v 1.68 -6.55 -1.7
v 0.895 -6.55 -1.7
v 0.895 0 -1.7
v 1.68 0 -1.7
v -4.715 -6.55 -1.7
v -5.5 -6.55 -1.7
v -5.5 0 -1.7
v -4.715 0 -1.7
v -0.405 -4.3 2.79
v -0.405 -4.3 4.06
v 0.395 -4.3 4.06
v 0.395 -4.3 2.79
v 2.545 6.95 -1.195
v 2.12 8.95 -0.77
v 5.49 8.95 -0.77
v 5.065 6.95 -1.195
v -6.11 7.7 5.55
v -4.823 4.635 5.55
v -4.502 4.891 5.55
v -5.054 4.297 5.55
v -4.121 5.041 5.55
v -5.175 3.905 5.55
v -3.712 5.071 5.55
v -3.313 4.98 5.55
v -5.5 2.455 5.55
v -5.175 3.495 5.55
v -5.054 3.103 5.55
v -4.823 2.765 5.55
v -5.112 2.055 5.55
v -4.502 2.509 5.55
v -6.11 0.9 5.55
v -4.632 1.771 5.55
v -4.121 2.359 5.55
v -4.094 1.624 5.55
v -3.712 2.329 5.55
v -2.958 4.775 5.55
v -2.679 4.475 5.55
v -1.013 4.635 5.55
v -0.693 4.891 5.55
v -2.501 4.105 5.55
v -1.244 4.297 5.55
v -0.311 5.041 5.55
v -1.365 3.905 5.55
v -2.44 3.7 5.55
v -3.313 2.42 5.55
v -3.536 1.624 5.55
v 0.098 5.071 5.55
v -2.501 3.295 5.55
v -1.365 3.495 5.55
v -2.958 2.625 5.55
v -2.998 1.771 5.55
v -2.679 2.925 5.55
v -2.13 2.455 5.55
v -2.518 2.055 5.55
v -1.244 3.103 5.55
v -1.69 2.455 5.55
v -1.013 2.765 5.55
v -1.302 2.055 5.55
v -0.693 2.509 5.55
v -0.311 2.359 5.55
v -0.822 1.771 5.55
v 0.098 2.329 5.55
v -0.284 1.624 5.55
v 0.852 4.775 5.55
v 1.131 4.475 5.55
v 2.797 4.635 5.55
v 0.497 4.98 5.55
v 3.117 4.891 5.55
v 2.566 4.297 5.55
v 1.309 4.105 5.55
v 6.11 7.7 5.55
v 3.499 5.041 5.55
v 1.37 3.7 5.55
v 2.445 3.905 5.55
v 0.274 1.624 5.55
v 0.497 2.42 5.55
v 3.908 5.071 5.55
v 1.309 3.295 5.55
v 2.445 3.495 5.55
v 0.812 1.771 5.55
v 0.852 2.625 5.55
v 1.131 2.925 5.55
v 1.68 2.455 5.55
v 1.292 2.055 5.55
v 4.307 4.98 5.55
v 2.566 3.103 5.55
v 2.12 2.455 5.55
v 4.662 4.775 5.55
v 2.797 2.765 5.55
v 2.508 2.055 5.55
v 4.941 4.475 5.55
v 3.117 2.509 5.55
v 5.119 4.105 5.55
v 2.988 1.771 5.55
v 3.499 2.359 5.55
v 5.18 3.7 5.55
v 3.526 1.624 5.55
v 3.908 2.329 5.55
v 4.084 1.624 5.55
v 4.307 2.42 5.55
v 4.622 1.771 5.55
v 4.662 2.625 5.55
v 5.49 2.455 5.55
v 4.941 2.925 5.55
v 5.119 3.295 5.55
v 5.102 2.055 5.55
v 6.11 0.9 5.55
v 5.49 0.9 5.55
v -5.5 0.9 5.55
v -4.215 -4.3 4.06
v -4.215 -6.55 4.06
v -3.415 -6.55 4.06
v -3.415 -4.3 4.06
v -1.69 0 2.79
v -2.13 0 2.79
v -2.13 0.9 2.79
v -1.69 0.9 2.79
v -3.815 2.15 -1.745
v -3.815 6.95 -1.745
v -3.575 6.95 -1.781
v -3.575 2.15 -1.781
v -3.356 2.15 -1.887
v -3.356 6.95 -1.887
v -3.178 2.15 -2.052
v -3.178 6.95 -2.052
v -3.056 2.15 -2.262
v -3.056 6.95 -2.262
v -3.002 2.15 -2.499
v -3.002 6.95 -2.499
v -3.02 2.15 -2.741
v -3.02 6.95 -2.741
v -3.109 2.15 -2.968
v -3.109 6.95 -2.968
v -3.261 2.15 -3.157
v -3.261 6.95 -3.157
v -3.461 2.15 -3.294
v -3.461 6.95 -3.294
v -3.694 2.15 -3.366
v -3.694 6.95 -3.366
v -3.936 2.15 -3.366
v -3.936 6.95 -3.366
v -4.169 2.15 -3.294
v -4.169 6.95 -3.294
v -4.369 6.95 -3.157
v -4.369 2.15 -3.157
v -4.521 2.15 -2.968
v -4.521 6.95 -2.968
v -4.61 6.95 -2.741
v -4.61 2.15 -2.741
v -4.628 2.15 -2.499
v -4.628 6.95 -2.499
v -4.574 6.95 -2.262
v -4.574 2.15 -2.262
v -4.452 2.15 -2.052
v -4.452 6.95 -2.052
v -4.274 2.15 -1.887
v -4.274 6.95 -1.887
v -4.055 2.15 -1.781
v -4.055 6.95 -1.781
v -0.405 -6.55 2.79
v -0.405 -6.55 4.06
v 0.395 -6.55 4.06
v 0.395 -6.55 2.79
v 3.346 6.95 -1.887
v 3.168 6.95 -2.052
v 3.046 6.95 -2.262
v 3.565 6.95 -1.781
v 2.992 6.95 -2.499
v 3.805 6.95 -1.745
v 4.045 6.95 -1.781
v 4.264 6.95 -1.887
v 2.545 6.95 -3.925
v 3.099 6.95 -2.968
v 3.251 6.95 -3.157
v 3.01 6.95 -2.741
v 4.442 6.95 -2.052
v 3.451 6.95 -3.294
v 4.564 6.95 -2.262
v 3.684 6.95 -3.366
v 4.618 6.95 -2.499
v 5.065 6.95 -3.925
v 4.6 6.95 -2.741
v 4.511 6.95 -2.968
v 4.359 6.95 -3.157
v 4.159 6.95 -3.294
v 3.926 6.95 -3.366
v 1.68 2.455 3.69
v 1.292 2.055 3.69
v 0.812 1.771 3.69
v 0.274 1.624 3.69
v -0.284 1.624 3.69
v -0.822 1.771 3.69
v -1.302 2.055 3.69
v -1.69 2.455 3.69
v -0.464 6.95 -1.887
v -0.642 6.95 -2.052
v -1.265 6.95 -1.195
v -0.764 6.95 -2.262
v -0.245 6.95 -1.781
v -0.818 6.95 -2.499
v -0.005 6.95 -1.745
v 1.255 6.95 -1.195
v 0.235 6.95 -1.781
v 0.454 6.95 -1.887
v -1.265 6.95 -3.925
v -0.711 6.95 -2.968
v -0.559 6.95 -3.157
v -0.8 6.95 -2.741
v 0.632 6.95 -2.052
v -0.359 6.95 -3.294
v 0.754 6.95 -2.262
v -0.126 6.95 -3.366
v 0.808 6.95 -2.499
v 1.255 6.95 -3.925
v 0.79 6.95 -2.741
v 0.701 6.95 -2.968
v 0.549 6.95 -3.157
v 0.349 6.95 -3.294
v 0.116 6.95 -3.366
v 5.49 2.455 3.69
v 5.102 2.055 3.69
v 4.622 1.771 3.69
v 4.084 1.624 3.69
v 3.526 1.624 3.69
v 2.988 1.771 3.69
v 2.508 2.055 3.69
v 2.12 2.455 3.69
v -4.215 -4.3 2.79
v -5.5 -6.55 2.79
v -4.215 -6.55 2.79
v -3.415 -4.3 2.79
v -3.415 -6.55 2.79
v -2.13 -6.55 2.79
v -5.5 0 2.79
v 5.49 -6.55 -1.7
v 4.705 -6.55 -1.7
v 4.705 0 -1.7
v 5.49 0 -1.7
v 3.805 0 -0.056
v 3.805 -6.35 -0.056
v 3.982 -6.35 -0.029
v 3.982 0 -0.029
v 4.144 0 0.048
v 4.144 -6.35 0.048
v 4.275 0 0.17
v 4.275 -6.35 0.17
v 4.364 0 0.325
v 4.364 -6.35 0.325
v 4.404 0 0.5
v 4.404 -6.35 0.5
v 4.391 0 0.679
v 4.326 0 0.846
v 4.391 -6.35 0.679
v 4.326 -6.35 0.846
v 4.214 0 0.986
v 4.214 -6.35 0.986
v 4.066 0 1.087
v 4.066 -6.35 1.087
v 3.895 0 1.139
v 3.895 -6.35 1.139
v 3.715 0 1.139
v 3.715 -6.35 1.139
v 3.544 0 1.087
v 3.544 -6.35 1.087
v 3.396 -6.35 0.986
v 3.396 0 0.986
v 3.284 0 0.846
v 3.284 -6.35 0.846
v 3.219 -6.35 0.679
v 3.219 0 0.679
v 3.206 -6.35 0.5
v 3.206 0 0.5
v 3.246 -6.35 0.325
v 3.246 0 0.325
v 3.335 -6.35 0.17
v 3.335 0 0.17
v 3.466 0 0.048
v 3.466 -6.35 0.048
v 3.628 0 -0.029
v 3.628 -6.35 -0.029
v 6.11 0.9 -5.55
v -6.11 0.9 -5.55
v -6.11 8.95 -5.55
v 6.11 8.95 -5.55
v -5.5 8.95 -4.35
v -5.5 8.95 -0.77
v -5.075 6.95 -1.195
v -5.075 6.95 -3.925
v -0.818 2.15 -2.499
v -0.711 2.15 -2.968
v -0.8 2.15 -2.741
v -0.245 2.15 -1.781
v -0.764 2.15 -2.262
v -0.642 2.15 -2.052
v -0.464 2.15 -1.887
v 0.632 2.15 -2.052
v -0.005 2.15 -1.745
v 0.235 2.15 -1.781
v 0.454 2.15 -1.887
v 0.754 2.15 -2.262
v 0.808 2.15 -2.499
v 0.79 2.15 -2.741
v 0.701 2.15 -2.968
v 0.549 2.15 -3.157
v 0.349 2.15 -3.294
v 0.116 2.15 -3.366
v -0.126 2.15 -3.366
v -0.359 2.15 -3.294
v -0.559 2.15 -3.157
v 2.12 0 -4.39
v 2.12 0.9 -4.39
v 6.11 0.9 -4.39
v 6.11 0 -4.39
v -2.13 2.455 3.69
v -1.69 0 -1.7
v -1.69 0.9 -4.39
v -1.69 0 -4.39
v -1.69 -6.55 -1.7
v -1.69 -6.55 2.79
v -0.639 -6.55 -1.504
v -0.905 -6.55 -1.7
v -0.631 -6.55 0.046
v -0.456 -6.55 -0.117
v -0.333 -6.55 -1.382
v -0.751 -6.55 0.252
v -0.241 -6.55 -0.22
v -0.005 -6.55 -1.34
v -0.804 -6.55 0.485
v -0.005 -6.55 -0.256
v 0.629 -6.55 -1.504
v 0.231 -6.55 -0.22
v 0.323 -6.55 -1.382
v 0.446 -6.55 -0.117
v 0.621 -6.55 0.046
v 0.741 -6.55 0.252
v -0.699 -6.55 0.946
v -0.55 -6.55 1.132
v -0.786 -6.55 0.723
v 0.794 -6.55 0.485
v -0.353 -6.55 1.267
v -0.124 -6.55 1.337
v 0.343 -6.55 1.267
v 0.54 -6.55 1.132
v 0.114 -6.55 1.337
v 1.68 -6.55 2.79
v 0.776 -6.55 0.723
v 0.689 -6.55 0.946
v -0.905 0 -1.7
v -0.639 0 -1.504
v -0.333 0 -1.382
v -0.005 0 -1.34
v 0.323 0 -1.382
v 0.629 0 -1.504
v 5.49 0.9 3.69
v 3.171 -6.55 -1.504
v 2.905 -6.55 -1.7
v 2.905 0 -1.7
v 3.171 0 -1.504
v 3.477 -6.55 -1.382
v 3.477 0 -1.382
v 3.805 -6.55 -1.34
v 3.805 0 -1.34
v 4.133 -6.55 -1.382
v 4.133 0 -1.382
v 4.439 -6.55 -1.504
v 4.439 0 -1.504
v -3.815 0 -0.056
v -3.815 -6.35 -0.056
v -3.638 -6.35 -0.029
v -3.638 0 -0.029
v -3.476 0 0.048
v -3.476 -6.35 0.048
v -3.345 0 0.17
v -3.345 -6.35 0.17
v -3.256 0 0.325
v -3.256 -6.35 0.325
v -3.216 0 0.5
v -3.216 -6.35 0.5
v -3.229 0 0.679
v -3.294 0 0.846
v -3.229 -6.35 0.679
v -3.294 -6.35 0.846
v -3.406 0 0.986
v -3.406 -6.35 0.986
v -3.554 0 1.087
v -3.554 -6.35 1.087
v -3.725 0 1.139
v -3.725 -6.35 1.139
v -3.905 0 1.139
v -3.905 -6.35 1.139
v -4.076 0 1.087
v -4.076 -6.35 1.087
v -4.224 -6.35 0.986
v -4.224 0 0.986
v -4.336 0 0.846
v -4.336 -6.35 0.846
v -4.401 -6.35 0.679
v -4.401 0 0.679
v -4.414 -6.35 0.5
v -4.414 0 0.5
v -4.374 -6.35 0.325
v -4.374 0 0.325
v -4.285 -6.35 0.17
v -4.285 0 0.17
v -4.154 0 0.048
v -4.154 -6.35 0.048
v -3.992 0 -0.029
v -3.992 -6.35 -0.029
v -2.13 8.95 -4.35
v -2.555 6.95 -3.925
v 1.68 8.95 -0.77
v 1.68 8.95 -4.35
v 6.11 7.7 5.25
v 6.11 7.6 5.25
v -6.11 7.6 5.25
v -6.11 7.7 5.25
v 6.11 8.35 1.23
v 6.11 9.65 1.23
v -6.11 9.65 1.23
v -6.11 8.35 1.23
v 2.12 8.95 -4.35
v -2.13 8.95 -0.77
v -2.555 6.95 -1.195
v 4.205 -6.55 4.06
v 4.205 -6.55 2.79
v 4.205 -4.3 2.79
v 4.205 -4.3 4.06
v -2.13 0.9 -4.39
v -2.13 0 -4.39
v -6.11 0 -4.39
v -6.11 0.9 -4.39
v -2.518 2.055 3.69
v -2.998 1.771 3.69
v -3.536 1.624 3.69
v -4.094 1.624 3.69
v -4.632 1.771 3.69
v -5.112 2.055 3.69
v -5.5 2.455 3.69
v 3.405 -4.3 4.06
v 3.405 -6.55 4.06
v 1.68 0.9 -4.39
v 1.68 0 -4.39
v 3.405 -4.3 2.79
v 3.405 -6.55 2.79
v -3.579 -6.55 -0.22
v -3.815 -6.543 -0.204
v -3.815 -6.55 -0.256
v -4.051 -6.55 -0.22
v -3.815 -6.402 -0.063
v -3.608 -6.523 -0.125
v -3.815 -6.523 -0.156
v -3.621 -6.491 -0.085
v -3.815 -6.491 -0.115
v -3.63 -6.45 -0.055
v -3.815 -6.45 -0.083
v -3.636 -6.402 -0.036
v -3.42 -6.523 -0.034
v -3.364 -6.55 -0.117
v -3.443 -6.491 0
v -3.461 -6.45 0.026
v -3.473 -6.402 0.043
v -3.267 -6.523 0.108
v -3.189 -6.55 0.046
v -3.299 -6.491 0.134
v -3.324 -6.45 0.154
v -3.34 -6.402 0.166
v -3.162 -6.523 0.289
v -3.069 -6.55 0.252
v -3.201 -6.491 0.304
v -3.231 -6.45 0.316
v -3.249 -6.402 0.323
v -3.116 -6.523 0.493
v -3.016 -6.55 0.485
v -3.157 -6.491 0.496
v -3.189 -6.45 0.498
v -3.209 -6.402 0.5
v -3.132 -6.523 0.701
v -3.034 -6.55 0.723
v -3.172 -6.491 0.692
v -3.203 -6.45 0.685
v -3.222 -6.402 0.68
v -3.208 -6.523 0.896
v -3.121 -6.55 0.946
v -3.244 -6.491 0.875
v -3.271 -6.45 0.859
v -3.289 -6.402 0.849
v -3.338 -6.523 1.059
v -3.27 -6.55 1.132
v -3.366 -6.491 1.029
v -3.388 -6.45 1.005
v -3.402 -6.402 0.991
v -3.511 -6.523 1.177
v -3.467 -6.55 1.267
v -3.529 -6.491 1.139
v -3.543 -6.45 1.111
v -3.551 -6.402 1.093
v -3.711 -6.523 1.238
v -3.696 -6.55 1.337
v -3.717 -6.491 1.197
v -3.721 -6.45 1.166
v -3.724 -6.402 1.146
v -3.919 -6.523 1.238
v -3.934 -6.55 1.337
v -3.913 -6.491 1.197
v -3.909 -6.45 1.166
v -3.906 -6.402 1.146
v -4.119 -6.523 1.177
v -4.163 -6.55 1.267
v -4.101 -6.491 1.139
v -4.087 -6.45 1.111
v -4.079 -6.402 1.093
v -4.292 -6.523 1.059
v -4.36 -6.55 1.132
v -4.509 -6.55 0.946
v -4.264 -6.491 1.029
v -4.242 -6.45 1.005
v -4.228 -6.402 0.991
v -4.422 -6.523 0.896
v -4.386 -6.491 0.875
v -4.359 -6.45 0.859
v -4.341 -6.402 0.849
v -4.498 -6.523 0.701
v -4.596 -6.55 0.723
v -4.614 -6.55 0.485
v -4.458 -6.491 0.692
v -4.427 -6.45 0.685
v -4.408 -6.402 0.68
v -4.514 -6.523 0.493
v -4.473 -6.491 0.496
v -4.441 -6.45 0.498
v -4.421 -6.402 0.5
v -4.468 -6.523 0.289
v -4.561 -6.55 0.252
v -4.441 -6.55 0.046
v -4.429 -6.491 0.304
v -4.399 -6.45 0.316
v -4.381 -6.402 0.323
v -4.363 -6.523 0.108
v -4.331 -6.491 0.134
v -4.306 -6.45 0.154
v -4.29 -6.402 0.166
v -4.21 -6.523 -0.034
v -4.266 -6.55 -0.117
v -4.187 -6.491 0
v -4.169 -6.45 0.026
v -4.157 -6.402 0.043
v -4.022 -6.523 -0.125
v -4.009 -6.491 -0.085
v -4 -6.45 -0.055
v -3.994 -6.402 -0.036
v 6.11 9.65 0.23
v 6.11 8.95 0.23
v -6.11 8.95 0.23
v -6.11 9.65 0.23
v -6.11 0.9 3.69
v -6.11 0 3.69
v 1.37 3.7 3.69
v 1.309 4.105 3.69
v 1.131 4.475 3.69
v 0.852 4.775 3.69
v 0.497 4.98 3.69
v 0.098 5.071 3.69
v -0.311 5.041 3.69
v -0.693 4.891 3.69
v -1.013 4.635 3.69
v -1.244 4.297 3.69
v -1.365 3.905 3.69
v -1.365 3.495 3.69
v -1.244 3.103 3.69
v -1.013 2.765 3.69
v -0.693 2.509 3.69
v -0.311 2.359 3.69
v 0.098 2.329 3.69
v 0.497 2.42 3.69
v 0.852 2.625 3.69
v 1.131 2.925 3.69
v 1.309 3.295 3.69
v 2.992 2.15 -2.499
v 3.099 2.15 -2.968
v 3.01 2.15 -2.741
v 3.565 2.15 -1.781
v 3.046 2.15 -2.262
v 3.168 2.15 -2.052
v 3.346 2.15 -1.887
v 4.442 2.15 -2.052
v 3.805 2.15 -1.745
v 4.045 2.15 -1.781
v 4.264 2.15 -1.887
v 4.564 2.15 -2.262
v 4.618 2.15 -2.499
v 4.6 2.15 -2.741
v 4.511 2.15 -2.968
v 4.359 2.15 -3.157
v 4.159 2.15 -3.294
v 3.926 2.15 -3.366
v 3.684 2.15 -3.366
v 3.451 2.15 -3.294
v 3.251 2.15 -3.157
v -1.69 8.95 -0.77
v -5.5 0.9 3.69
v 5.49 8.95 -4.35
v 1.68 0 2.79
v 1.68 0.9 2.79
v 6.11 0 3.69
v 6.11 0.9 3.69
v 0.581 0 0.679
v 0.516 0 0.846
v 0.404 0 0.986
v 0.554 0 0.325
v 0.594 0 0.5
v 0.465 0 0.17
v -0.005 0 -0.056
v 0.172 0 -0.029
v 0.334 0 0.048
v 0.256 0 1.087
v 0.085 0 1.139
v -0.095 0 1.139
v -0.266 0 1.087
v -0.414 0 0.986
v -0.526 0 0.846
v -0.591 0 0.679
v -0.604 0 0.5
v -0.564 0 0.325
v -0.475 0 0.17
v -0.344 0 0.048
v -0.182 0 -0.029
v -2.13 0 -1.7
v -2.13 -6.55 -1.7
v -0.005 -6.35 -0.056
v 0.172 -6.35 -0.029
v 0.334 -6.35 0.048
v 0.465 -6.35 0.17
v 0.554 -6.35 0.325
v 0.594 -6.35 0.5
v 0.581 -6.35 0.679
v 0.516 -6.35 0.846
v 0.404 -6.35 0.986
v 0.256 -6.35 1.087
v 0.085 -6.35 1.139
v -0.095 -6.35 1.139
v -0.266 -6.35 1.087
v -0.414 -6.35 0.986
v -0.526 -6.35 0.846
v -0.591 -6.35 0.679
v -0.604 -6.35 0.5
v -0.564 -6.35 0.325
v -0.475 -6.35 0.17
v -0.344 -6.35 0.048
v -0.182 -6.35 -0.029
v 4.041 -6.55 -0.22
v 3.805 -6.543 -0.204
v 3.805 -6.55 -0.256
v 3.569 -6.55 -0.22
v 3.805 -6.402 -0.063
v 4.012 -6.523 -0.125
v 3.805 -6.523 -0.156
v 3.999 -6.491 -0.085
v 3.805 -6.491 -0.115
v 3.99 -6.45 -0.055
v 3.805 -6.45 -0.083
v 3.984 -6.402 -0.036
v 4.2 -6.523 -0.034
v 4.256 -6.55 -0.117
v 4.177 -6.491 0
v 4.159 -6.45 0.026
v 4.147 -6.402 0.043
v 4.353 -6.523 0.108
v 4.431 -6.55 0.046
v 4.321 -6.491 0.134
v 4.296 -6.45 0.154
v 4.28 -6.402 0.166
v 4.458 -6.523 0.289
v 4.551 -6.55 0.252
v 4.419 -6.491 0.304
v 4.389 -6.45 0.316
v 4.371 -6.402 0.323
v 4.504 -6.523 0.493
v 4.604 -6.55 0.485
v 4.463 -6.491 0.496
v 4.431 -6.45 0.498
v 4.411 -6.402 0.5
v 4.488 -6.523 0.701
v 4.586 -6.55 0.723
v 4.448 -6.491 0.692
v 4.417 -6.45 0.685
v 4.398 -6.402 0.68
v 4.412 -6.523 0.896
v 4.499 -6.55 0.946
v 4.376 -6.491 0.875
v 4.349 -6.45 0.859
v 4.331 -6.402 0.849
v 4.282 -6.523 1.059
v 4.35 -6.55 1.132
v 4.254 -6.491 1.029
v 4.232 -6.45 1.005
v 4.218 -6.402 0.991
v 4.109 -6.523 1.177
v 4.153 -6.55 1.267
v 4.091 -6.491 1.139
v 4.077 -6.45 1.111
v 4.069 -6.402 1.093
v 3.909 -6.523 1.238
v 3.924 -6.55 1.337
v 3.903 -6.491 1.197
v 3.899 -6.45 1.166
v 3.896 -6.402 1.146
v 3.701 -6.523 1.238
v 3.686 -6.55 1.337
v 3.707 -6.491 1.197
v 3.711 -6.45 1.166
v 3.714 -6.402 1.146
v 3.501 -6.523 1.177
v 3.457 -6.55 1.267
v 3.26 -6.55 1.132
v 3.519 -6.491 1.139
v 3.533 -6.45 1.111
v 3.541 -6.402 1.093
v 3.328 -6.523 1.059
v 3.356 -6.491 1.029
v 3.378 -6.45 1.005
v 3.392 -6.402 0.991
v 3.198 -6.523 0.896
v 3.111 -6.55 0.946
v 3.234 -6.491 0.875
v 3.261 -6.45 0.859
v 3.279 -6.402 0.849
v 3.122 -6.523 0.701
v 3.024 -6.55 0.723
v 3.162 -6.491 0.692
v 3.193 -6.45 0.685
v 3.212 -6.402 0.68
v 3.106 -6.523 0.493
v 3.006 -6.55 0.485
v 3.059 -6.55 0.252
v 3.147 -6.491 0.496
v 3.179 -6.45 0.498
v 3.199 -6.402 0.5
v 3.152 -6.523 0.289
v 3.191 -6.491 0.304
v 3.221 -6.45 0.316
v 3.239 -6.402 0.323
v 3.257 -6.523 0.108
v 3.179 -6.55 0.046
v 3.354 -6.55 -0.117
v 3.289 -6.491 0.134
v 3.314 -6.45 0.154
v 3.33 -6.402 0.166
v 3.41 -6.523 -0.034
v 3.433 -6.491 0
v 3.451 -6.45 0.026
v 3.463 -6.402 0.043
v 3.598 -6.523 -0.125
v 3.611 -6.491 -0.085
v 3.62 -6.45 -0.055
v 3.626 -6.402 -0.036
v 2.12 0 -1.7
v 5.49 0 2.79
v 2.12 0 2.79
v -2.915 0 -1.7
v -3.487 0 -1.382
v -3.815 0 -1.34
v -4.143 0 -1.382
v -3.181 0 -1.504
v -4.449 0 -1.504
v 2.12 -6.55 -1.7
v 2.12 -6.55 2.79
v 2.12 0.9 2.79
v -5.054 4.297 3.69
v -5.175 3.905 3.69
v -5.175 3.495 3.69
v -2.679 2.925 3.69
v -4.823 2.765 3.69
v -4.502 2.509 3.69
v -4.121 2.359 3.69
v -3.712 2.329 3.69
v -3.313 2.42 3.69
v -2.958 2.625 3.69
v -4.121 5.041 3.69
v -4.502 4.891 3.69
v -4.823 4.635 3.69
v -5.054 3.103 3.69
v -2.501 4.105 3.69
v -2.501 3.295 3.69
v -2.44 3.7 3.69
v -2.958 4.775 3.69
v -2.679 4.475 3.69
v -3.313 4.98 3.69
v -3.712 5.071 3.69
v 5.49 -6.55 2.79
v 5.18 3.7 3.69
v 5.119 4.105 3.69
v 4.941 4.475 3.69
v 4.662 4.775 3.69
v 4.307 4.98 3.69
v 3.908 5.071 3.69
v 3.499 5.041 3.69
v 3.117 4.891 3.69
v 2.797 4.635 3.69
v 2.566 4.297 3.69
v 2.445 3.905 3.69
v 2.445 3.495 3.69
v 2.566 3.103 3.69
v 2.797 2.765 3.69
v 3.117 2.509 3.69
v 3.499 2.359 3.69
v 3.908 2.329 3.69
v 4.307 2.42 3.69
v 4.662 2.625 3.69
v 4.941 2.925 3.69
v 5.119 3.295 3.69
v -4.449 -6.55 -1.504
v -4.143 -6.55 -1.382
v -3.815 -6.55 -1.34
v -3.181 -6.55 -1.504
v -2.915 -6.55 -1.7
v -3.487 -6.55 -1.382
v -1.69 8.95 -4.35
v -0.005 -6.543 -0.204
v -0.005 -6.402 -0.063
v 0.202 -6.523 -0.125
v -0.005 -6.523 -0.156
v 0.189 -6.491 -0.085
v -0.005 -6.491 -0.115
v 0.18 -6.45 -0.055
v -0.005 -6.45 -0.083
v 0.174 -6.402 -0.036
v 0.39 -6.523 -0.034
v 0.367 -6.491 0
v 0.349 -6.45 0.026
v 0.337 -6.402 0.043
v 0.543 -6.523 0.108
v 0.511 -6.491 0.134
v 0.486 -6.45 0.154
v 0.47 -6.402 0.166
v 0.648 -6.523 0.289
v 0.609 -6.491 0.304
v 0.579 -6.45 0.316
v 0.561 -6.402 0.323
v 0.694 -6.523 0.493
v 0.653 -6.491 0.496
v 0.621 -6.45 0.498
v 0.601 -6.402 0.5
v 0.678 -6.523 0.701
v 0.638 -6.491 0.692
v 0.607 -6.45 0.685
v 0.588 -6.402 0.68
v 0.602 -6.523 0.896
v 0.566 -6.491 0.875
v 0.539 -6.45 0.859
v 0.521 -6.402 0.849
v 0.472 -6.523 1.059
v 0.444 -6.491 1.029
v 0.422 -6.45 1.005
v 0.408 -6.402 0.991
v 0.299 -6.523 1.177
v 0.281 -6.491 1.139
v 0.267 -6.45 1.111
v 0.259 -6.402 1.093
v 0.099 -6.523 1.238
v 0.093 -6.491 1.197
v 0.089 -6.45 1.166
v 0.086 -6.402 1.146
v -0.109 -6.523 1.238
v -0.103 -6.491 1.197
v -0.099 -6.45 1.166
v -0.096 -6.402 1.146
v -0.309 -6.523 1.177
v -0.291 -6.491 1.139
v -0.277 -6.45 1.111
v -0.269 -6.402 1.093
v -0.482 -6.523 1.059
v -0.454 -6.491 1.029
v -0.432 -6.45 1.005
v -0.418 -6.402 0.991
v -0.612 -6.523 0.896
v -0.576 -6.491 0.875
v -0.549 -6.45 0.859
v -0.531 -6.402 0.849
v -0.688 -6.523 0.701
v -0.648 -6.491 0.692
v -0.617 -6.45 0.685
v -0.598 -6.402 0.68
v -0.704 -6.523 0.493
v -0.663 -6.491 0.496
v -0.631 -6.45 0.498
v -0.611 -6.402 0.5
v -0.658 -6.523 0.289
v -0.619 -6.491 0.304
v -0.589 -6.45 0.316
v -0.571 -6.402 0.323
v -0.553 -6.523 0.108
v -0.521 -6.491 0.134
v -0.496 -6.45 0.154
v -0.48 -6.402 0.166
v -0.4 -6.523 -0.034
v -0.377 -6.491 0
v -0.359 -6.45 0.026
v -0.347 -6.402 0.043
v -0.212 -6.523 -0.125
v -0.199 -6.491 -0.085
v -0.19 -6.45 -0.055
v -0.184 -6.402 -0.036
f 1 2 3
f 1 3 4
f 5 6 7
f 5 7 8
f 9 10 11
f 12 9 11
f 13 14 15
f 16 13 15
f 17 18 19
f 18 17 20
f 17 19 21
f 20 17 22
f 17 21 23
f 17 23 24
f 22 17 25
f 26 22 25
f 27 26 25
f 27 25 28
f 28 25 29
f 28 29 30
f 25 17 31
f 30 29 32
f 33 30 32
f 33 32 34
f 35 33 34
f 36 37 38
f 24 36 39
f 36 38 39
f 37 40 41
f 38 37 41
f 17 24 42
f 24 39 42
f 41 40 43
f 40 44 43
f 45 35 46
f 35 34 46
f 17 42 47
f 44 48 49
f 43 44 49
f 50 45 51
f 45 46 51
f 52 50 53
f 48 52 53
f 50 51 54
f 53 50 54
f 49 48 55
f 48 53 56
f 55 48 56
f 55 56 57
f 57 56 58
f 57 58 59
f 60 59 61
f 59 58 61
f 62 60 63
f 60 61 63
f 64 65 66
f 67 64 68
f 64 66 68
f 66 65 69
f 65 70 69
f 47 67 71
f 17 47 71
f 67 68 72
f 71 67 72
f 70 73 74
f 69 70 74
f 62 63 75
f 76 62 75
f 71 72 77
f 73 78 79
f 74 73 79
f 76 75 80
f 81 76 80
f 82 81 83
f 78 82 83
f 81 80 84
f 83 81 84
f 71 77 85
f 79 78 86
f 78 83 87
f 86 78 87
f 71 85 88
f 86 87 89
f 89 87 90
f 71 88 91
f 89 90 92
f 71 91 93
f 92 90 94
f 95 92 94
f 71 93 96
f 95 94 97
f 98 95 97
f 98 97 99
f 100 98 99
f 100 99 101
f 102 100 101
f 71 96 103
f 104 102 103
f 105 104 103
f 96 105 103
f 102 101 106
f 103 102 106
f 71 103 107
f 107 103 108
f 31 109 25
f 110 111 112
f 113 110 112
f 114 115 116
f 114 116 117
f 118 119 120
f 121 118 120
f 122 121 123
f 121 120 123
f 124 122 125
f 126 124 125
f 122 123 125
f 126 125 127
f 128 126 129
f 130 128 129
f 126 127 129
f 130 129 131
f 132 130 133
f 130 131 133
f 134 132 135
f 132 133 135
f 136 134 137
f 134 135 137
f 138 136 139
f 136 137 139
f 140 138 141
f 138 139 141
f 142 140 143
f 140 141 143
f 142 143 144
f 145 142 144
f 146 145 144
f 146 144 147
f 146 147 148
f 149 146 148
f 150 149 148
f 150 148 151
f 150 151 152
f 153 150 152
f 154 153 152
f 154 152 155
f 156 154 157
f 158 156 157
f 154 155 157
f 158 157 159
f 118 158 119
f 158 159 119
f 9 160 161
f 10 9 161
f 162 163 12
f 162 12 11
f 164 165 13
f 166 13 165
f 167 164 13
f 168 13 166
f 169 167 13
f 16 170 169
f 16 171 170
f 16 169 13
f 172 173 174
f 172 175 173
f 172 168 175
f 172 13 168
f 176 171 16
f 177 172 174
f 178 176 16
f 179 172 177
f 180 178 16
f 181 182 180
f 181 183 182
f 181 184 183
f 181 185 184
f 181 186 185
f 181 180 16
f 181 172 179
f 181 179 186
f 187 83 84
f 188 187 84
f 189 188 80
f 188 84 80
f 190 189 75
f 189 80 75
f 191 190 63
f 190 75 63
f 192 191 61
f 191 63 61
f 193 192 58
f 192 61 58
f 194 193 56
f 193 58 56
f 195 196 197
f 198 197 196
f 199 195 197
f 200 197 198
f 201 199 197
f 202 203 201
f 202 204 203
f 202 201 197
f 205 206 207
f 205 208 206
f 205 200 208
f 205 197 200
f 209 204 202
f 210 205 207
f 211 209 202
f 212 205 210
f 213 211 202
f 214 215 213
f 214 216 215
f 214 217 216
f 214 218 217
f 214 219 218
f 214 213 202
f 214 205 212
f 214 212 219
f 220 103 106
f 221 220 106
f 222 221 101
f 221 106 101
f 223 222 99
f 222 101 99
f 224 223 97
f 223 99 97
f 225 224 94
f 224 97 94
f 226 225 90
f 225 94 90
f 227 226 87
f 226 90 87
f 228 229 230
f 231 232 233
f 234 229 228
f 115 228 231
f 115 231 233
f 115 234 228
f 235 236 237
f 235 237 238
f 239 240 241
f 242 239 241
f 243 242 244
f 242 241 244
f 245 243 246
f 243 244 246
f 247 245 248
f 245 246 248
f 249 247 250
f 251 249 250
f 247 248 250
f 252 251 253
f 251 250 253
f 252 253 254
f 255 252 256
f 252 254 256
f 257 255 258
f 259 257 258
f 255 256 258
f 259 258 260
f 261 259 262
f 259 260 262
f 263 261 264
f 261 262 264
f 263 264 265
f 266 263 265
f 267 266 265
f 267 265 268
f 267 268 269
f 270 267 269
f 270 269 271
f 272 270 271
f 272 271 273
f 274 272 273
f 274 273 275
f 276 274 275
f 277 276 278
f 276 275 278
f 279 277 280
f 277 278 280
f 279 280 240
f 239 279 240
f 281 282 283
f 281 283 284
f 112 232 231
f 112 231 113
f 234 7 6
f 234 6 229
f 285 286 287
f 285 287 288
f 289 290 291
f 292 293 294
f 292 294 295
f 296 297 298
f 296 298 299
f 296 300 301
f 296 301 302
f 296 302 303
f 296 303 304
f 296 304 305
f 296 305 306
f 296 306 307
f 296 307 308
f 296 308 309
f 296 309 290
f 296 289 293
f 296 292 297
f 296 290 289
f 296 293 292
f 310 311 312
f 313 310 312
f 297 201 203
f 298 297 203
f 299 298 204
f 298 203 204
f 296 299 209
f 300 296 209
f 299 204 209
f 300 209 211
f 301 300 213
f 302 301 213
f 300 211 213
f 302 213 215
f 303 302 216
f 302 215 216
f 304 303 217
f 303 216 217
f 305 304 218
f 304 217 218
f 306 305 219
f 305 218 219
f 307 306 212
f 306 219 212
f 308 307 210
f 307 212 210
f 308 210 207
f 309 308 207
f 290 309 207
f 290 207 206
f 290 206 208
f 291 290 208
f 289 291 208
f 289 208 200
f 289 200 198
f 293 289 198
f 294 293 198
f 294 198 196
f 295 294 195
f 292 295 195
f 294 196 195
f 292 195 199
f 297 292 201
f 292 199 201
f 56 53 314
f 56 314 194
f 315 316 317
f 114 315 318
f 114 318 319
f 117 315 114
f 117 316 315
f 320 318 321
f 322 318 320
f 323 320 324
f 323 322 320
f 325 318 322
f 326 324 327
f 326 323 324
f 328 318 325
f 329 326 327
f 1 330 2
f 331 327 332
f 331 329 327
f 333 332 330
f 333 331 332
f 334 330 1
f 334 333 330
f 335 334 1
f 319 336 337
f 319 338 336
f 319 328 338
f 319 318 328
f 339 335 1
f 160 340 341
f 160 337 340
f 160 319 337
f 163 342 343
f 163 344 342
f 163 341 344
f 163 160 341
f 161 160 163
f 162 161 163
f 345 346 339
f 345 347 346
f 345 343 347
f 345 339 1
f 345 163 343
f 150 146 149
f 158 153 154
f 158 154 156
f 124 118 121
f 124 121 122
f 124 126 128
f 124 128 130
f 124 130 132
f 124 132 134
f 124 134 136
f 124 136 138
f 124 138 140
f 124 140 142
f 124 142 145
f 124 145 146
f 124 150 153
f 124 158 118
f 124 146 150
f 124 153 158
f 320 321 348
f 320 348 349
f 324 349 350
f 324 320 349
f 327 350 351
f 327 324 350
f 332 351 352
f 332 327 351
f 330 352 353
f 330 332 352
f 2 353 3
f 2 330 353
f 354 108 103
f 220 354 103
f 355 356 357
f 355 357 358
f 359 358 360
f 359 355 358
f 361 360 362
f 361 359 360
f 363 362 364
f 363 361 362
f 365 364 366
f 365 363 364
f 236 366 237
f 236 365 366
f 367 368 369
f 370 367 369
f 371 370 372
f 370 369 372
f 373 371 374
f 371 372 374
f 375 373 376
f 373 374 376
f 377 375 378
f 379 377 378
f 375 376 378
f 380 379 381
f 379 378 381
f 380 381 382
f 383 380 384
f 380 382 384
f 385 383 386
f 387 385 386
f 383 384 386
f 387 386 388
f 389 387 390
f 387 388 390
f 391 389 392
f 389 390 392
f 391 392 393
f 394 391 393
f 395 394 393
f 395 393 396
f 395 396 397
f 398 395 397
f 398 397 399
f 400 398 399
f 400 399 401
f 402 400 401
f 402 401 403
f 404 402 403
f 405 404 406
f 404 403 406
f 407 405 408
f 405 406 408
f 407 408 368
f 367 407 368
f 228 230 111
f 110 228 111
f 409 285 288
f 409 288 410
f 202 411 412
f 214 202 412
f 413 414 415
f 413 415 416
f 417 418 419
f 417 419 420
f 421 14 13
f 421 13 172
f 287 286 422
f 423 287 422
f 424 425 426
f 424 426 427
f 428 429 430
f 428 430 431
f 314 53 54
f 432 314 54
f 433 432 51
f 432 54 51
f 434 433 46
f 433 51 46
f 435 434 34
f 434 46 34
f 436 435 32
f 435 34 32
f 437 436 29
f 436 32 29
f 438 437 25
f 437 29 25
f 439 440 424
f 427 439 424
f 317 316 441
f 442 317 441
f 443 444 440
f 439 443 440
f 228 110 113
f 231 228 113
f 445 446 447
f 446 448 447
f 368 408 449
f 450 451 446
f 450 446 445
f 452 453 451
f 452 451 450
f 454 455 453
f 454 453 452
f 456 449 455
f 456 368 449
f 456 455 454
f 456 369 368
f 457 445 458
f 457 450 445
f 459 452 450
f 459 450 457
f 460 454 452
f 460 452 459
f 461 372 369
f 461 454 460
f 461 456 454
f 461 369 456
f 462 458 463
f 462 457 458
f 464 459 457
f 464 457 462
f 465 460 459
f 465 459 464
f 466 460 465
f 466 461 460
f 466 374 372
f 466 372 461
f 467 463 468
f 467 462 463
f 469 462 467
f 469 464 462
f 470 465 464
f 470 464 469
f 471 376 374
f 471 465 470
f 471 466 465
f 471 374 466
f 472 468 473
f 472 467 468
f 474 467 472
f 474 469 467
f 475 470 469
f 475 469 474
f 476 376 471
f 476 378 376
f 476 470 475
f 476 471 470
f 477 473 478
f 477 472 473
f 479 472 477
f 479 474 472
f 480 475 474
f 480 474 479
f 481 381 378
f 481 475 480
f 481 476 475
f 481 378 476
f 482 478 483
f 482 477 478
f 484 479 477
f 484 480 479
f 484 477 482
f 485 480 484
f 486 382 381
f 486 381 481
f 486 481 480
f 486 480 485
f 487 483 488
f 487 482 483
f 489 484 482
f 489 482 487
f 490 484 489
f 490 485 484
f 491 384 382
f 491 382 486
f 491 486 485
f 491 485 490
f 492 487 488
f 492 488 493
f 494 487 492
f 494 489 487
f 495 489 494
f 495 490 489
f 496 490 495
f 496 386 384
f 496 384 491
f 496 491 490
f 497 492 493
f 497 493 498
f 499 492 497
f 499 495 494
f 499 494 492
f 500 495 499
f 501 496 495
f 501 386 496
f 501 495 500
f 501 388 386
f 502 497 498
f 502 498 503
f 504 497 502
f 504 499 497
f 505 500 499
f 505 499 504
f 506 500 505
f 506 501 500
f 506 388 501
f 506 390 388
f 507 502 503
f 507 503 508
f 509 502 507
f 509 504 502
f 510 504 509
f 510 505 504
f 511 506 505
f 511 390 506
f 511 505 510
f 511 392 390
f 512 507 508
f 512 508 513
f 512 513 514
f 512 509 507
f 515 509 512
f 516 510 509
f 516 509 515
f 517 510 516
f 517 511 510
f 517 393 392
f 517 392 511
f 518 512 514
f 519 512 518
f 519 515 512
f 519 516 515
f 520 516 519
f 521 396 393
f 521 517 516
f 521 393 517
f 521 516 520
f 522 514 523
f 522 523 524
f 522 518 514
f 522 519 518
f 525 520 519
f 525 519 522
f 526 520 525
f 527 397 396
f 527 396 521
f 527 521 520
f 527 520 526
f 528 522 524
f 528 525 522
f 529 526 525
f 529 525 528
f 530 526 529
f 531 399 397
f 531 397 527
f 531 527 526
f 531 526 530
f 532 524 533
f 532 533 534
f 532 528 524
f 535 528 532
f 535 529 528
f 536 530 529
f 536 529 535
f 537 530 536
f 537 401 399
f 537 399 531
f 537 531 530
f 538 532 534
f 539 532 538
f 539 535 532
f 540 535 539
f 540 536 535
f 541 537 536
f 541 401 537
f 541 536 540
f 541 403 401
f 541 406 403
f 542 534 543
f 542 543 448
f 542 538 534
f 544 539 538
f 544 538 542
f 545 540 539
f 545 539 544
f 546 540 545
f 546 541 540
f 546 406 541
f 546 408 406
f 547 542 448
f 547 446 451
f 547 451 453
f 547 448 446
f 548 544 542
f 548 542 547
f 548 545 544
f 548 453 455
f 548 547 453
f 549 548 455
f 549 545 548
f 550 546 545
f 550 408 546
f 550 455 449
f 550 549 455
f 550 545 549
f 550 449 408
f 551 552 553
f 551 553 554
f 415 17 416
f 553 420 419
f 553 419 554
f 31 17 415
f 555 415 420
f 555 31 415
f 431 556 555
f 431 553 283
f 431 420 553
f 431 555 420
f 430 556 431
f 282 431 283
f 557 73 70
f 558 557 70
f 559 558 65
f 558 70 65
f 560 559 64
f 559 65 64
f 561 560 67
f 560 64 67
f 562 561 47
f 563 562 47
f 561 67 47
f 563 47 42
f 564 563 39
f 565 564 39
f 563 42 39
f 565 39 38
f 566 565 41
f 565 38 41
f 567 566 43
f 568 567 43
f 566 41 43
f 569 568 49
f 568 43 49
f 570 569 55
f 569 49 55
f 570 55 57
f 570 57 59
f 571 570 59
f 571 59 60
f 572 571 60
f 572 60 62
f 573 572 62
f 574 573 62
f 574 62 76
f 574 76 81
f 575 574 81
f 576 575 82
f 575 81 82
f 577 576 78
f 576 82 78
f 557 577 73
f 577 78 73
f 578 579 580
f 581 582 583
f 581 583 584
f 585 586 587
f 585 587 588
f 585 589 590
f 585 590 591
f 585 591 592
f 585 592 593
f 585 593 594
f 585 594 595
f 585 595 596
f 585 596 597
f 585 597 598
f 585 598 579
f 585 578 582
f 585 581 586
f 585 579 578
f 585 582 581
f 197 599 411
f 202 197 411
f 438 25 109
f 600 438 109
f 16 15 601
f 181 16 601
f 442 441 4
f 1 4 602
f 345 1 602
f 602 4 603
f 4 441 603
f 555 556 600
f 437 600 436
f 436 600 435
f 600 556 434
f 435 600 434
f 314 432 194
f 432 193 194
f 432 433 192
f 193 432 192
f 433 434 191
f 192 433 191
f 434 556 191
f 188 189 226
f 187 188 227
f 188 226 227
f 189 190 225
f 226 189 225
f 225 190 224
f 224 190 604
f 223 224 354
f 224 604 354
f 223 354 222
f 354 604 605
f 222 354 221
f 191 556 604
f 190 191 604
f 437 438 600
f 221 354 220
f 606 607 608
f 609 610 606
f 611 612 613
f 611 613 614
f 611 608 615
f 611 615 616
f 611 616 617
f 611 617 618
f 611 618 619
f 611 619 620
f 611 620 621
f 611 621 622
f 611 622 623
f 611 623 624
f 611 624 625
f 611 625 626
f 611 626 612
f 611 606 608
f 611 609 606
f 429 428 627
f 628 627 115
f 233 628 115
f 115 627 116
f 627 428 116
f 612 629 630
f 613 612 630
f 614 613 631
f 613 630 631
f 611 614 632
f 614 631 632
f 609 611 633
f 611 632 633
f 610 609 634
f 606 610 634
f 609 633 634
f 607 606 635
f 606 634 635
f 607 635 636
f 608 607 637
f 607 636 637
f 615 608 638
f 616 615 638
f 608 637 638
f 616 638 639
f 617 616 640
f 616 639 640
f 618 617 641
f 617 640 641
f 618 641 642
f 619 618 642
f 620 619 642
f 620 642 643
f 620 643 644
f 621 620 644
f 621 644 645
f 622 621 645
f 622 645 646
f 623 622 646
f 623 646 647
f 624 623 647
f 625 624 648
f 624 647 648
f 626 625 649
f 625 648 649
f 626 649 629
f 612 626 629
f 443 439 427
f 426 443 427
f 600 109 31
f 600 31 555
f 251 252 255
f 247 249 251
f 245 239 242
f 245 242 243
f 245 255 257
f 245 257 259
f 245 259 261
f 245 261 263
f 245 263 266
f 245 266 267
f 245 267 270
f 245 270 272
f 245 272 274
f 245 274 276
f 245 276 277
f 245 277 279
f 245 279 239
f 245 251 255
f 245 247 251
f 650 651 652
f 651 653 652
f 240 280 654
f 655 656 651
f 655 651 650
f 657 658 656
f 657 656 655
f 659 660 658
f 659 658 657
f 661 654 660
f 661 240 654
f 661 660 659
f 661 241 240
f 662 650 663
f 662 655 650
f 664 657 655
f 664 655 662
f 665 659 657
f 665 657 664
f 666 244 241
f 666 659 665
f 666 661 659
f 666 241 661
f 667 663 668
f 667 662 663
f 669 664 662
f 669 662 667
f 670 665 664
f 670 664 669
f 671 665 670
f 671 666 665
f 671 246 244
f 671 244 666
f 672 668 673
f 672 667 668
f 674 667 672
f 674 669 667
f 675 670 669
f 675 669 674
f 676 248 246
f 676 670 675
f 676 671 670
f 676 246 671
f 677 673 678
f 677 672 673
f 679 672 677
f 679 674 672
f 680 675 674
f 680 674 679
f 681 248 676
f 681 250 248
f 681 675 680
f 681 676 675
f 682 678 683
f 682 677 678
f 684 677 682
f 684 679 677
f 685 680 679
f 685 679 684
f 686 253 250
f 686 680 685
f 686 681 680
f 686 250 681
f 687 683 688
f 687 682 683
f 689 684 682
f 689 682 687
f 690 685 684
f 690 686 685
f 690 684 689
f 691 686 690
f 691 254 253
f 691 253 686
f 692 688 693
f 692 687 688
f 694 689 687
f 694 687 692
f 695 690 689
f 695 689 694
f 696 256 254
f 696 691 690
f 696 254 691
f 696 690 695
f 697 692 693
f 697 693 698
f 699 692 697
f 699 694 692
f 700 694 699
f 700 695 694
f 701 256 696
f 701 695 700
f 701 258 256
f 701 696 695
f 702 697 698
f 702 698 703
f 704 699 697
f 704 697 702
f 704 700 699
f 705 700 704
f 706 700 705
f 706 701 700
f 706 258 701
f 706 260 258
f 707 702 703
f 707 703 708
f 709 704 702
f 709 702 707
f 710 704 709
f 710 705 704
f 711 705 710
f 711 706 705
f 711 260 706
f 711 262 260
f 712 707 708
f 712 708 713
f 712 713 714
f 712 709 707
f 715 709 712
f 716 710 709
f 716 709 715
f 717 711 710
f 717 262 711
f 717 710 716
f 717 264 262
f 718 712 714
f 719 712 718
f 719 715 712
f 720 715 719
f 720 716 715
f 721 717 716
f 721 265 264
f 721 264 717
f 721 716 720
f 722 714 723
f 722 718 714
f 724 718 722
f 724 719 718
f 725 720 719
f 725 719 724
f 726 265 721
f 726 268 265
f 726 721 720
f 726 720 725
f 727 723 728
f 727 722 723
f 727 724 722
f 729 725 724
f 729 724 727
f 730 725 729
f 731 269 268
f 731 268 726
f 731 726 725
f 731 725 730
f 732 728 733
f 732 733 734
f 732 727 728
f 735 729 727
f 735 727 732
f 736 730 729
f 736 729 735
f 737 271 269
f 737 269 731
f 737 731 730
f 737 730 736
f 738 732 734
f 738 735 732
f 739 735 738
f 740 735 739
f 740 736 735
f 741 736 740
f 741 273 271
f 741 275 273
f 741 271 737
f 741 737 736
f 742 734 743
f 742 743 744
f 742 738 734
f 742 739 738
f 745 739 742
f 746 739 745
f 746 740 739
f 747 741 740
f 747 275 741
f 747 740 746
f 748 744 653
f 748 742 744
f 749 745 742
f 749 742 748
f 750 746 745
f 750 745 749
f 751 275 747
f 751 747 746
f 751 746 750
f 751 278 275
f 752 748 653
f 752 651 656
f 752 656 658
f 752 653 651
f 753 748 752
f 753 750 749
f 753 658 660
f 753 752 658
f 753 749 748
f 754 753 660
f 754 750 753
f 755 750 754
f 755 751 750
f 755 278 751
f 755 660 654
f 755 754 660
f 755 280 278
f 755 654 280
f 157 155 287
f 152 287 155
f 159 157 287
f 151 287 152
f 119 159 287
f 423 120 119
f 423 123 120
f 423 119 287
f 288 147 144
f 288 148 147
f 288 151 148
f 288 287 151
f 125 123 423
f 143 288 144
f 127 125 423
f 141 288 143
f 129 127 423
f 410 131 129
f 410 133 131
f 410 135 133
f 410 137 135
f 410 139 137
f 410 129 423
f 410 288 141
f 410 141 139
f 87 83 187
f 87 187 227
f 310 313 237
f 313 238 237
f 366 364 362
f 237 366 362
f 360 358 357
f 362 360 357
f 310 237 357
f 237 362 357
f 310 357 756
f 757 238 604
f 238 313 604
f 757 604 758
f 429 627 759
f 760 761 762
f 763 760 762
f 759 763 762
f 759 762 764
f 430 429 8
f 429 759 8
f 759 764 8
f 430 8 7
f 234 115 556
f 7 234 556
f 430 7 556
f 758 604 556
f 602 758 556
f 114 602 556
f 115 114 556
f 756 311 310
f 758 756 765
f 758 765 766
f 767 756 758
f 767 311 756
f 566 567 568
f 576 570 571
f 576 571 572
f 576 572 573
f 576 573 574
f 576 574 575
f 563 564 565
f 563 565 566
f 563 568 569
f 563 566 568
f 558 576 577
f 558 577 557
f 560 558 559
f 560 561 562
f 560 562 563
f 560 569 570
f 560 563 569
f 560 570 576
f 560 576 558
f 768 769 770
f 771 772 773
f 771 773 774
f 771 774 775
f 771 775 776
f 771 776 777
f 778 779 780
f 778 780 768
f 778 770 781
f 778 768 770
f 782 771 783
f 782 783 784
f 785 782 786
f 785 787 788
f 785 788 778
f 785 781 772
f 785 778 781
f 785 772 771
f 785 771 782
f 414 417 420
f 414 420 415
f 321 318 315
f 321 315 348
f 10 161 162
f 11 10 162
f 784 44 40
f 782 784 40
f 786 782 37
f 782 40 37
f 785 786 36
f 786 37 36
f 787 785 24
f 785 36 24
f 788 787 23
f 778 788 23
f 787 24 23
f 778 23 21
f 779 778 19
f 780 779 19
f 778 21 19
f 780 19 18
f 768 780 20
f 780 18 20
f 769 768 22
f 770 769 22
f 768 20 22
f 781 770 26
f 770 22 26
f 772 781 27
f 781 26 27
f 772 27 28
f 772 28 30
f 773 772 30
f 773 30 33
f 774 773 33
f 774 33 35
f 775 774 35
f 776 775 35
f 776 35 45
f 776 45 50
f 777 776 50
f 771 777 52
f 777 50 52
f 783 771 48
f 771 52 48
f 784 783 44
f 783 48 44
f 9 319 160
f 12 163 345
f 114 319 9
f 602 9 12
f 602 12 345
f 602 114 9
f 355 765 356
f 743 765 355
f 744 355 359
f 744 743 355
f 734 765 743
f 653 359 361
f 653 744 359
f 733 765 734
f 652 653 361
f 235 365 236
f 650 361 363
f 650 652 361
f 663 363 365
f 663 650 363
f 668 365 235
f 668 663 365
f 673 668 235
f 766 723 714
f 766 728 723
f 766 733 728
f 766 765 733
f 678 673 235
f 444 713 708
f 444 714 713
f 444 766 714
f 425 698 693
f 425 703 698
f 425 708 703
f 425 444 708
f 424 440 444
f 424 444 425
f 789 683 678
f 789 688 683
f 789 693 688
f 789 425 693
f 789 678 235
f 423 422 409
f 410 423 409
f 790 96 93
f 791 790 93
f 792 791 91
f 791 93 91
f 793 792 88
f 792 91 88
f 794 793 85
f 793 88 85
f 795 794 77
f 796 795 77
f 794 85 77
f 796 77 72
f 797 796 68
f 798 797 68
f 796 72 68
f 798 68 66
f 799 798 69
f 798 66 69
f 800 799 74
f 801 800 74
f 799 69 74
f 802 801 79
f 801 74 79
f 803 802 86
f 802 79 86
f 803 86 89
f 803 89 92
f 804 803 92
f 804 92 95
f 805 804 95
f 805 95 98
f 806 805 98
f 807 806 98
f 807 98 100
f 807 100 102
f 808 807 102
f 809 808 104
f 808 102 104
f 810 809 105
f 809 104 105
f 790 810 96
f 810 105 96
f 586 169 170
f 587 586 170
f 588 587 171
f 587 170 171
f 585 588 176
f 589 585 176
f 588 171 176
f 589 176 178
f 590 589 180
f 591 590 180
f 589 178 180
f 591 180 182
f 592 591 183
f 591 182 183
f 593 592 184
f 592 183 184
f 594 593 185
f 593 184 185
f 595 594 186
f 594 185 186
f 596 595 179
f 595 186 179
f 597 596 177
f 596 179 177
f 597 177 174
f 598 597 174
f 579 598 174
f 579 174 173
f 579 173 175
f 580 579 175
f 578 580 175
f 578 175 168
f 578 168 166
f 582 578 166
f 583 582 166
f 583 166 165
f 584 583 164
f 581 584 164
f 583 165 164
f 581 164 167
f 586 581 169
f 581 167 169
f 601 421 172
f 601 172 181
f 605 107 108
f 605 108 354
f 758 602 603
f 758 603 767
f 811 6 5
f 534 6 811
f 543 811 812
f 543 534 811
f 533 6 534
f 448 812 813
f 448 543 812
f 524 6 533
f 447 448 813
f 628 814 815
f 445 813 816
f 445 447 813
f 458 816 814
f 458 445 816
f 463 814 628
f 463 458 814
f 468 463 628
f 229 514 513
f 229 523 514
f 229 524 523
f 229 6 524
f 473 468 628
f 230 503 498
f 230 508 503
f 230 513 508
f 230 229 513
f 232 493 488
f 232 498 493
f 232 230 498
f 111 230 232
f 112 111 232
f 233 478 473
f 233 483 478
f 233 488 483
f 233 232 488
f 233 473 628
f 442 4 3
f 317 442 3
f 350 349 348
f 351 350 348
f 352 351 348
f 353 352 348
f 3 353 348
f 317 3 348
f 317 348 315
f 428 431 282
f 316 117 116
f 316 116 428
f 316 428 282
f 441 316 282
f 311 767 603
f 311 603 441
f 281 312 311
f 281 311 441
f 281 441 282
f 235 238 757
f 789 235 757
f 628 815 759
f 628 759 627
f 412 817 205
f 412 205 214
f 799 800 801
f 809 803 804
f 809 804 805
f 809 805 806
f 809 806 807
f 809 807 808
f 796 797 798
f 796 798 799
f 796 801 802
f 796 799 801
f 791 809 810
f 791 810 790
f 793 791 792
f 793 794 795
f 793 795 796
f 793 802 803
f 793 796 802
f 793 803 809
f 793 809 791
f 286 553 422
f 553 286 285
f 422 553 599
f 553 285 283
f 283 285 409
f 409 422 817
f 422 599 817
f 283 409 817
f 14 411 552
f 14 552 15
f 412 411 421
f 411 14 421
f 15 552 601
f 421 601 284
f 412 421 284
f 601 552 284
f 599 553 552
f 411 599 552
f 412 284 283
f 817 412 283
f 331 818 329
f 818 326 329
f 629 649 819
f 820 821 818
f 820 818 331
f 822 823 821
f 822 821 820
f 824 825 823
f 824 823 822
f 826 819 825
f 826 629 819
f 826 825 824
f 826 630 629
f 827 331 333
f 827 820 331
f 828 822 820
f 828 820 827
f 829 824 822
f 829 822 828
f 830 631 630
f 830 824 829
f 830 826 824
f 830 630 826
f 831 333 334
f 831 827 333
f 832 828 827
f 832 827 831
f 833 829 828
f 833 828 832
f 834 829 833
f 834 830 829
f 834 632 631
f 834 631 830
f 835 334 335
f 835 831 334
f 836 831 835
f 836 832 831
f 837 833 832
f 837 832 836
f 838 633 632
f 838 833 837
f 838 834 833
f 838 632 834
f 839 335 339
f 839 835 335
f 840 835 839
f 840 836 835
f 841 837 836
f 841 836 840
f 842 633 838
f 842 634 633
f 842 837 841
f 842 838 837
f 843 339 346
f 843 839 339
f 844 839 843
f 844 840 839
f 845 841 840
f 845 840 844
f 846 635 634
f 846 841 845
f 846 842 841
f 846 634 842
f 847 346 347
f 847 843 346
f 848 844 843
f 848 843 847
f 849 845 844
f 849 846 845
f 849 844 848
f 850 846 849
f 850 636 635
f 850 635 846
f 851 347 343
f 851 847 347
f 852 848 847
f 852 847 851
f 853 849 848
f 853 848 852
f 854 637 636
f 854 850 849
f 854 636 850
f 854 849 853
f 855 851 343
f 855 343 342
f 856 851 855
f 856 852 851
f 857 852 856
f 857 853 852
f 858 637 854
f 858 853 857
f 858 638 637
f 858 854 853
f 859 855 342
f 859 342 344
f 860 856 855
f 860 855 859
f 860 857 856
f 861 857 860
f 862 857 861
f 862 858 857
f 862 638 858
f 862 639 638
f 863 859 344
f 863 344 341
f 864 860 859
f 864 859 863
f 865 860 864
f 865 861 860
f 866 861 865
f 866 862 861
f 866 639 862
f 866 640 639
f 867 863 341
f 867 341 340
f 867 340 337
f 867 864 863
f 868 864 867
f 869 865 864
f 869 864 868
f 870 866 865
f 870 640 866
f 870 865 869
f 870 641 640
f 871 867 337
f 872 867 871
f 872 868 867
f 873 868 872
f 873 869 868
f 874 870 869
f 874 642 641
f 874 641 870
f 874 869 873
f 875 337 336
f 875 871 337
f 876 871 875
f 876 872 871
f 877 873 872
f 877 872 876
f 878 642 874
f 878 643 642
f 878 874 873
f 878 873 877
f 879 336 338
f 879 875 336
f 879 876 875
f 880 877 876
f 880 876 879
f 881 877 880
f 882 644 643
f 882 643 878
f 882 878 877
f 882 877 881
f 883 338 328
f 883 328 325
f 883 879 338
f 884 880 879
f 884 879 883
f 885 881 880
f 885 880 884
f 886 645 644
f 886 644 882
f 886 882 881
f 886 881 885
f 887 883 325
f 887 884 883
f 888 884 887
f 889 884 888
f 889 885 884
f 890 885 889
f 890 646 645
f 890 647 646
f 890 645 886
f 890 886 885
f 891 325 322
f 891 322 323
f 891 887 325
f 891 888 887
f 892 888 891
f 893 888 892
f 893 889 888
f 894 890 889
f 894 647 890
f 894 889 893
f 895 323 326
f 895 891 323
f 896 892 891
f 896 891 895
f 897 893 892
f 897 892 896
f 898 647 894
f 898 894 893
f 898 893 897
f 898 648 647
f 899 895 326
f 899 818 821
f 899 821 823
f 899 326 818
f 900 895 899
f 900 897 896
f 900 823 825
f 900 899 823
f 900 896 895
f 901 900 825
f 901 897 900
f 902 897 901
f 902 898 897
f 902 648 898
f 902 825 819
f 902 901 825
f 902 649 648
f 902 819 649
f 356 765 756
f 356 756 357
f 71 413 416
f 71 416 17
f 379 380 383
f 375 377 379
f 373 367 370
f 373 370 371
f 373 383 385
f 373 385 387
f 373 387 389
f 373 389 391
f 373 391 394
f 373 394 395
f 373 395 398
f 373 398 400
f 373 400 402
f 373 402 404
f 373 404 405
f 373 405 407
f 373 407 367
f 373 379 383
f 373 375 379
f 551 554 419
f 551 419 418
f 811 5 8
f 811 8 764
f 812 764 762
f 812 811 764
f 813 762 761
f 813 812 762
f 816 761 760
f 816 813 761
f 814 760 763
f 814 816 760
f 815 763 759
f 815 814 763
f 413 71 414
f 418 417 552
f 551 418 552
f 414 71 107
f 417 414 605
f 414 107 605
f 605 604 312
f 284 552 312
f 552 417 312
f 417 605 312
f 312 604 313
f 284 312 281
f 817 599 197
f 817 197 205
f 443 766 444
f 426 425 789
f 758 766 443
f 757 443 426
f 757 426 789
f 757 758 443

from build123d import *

# Parameters (mm, degrees)
SKETCH1_W                 = 12.22
SKETCH1_H                 = 11.1
BOSS_EXTRUDE1_DEPTH       = 9.65
SKETCH2_W                 = 5.78
SKETCH2_H                 = 0.7
CUT_EXTRUDE1_DEPTH        = 17.530378096
SKETCH4_W                 = 1.86
SKETCH4_H                 = 0.9
SKETCH4_W_2               = 1.16
CUT_EXTRUDE3_DEPTH        = 17.530378096
SKETCH5_W                 = 10.98
SKETCH5_H                 = 7.18
CUT_EXTRUDE4_DEPTH        = 0.9
SKETCH6_W                 = 3.37
SKETCH6_H                 = 7.18
BOSS_EXTRUDE2_DEPTH       = 7.45
SKETCH7_W                 = 0.8
SKETCH7_H                 = 1.27
BOSS_EXTRUDE3_DEPTH       = 2.25
SKETCH8_R                 = 0.601040764
CUT_EXTRUDE5_DEPTH        = 6.55
FILLET1_R                 = 0.2
SKETCH9_R                 = 1.375
CUT_EXTRUDE6_DEPTH        = 1.86
SKETCH11_W                = 3.37
SKETCH11_H                = 3.58
CUT_EXTRUDE8_DEPTH        = 2
CUT_EXTRUDE8_DRAFT        = -12
SKETCH12_R                = 0.815
CUT_EXTRUDE9_DEPTH        = 4.8
LPATTERN1_COUNT           = 3
LPATTERN1_PITCH           = 3.81
LPATTERN1_COPY_1_SKETCH_W = 3.37
LPATTERN1_COPY_1_SKETCH_H = 3.58
LPATTERN1_COPY_1_DEPTH    = 2
LPATTERN1_COPY_1_DRAFT    = -12
LPATTERN1_COPY_2_SKETCH_W = 3.37
LPATTERN1_COPY_2_SKETCH_H = 3.58
LPATTERN1_COPY_2_DEPTH    = 2
LPATTERN1_COPY_2_DRAFT    = -12
FILLET1_OF_LPATTERN1_R    = 0.2
SKETCH10_W                = 0.44
SKETCH10_H                = 1.555090365
CUT_EXTRUDE7_DEPTH        = 1.86
LPATTERN2_COUNT           = 2
LPATTERN2_PITCH           = 3.81


with BuildPart() as part:
    # Sketch1 → Boss-Extrude1 (new body)
    with BuildSketch(Plane(origin=(0, 0, 0), x_dir=(1, 0, 0), z_dir=(0, 1, 0))):
        Rectangle(SKETCH1_W, SKETCH1_H)
    extrude(amount=BOSS_EXTRUDE1_DEPTH)

    # Sketch2 → Cut-Extrude1 (cut, through all)
    with BuildSketch(Plane(origin=(6.11, 0, 0), x_dir=(0, 0, -1), z_dir=(1, 0, 0))):
        Polygon((-1.23, 9.65), (-1.23, 8.35), (-5.25, 7.6), (-5.25, 7.7), (-5.55, 7.7), (-5.55, 9.65), align=None)
        with Locations((2.66, 9.3)):
            Rectangle(SKETCH2_W, SKETCH2_H)
    extrude(amount=-CUT_EXTRUDE1_DEPTH, mode=Mode.SUBTRACT)

    # Sketch4 → Cut-Extrude3 (cut, through all)
    with BuildSketch(Plane(origin=(6.11, 0, 0), x_dir=(0, 0, -1), z_dir=(1, 0, 0))):
        with Locations((-4.62, 0.45)):
            Rectangle(SKETCH4_W, SKETCH4_H)
        with Locations((4.97, 0.45)):
            Rectangle(SKETCH4_W_2, SKETCH4_H)
    extrude(amount=-CUT_EXTRUDE3_DEPTH, mode=Mode.SUBTRACT)

    # Sketch5 → Cut-Extrude4 (cut)
    with BuildSketch(Plane.XZ):
        with Locations((0, -0.8)):
            Rectangle(SKETCH5_W, SKETCH5_H)
    extrude(amount=-CUT_EXTRUDE4_DEPTH, mode=Mode.SUBTRACT)

    # Sketch6 → Boss-Extrude2 (add)
    with BuildSketch(Plane.XZ.offset(-0.9)):
        with Locations((3.805, -0.8)):
            Rectangle(SKETCH6_W, SKETCH6_H)
    boss_extrude2 = extrude(amount=BOSS_EXTRUDE2_DEPTH)

    # Sketch7 → Boss-Extrude3 (add)
    with BuildSketch(Plane.XZ.offset(6.55)):
        with Locations((3.805, 3.425)):
            Rectangle(SKETCH7_W, SKETCH7_H)
    boss_extrude3 = extrude(amount=-BOSS_EXTRUDE3_DEPTH)

    # Sketch8 → Cut-Extrude5 (cut)
    with BuildSketch(Plane.XZ.offset(6.55)):
        with Locations(Location((3.805, 0.545, 0), (0, 0, 270))):
            Circle(SKETCH8_R)
        with BuildLine():
            Line((2.12, -1.7), (2.905, -1.7))
            ThreePointArc((2.905, -1.7), (3.805, -1.34), (4.705, -1.7))
            Line((4.705, -1.7), (5.49, -1.7))
            Line((5.49, -1.7), (5.49, -4.39))
            Line((5.49, -4.39), (2.12, -4.39))
            Line((2.12, -4.39), (2.12, -1.7))
        make_face()
    cut_extrude5 = extrude(amount=-CUT_EXTRUDE5_DEPTH, mode=Mode.SUBTRACT)

    # Fillet1
    fillet1_edges = [part.edges().sort_by_distance(p)[0] for p in [
        (3.805, -6.55, 1.146040764),
    ]]
    fillet(fillet1_edges, radius=FILLET1_R)

    # Sketch9 → Cut-Extrude6 (cut)
    with BuildSketch(Plane.XY.offset(5.55)):
        with Locations((3.805, 3.7)):
            Circle(SKETCH9_R)
        with BuildLine():
            Line((2.12, 2.455090365), (2.12, 0.9))
            Line((2.12, 0.9), (5.49, 0.9))
            Line((5.49, 0.9), (5.49, 2.455090365))
            ThreePointArc((5.49, 2.455090365), (3.805, 1.605), (2.12, 2.455090365))
        make_face()
    cut_extrude6 = extrude(amount=-CUT_EXTRUDE6_DEPTH, mode=Mode.SUBTRACT)


with BuildPart() as cut_extrude8_tool:
    # Sketch11 → Cut-Extrude8 (with draft: the straight prism first)
    with BuildSketch(Plane(origin=(0, 8.95, 0), x_dir=(1, 0, 0), z_dir=(0, 1, 0))):
        with Locations((3.805, 2.56)):
            Rectangle(SKETCH11_W, SKETCH11_H)
    extrude(amount=-CUT_EXTRUDE8_DEPTH)
    # Cut-Extrude8: the draft: its side faces are tilted about the plane it starts from
    cut_extrude8_sides = [cut_extrude8_tool.faces().sort_by_distance(p)[0] for p in [
        (5.49, 7.95, -2.56),
        (3.805, 7.95, -4.35),
        (2.12, 7.95, -2.56),
        (3.805, 7.95, -0.77),
    ]]
    draft(cut_extrude8_sides, Plane(origin=(0, 8.95, 0), x_dir=(1, 0, 0), z_dir=(0, 1, 0)), CUT_EXTRUDE8_DRAFT)


with BuildPart() as part_1:
    add(part.part)

    # Cut-Extrude8: cut by cut_extrude8_tool
    add(cut_extrude8_tool.part, mode=Mode.SUBTRACT)

    # Sketch12 → Cut-Extrude9 (cut)
    with BuildSketch(Plane(origin=(0, 6.95, 0), x_dir=(1, 0, 0), z_dir=(0, 1, 0))):
        with Locations(Location((3.805, 2.56, 0), (0, 0, 270))):
            Circle(SKETCH12_R)
    cut_extrude9 = extrude(amount=-CUT_EXTRUDE9_DEPTH, mode=Mode.SUBTRACT)

    # LPattern1: Boss-Extrude2, Boss-Extrude3, Cut-Extrude5, Cut-Extrude6, Cut-Extrude9 ×3
    with Locations(*[(-i * LPATTERN1_PITCH, 0, 0) for i in range(1, LPATTERN1_COUNT)]):
        add(boss_extrude2)
        add(boss_extrude3)
        add(cut_extrude5, mode=Mode.SUBTRACT)
        add(cut_extrude6, mode=Mode.SUBTRACT)
        add(cut_extrude9, mode=Mode.SUBTRACT)


with BuildPart() as lpattern1_copy_1_tool:
    # LPattern1 copy 1 sketch → LPattern1 copy 1 (with draft: the straight prism first)
    with BuildSketch(Plane(origin=(-3.81, 8.95, 0), x_dir=(1, 0, 0), z_dir=(0, 1, 0))):
        with Locations((3.805, 2.56)):
            Rectangle(LPATTERN1_COPY_1_SKETCH_W, LPATTERN1_COPY_1_SKETCH_H)
    extrude(amount=-LPATTERN1_COPY_1_DEPTH)
    # LPattern1 copy 1: the draft: its side faces are tilted about the plane it starts from
    lpattern1_copy_1_sides = [lpattern1_copy_1_tool.faces().sort_by_distance(p)[0] for p in [
        (1.68, 7.95, -2.56),
        (-0.005, 7.95, -4.35),
        (-1.69, 7.95, -2.56),
        (-0.005, 7.95, -0.77),
    ]]
    draft(lpattern1_copy_1_sides, Plane(origin=(-3.81, 8.95, 0), x_dir=(1, 0, 0), z_dir=(0, 1, 0)), LPATTERN1_COPY_1_DRAFT)


with BuildPart() as part_2:
    add(part_1.part)

    # LPattern1 copy 1: cut by lpattern1_copy_1_tool
    add(lpattern1_copy_1_tool.part, mode=Mode.SUBTRACT)


with BuildPart() as lpattern1_copy_2_tool:
    # LPattern1 copy 2 sketch → LPattern1 copy 2 (with draft: the straight prism first)
    with BuildSketch(Plane(origin=(-7.62, 8.95, 0), x_dir=(1, 0, 0), z_dir=(0, 1, 0))):
        with Locations((3.805, 2.56)):
            Rectangle(LPATTERN1_COPY_2_SKETCH_W, LPATTERN1_COPY_2_SKETCH_H)
    extrude(amount=-LPATTERN1_COPY_2_DEPTH)
    # LPattern1 copy 2: the draft: its side faces are tilted about the plane it starts from
    lpattern1_copy_2_sides = [lpattern1_copy_2_tool.faces().sort_by_distance(p)[0] for p in [
        (-2.13, 7.95, -2.56),
        (-3.815, 7.95, -4.35),
        (-5.5, 7.95, -2.56),
        (-3.815, 7.95, -0.77),
    ]]
    draft(lpattern1_copy_2_sides, Plane(origin=(-7.62, 8.95, 0), x_dir=(1, 0, 0), z_dir=(0, 1, 0)), LPATTERN1_COPY_2_DRAFT)


with BuildPart() as part_3:
    add(part_2.part)

    # LPattern1 copy 2: cut by lpattern1_copy_2_tool
    add(lpattern1_copy_2_tool.part, mode=Mode.SUBTRACT)

    # Fillet1 of LPattern1
    fillet1_of_lpattern1_edges = [part_3.edges().sort_by_distance(p)[0] for p in [
        (-0.005, -6.55, 1.146040764),
        (-3.815, -6.55, 1.146040764),
    ]]
    fillet(fillet1_of_lpattern1_edges, radius=FILLET1_OF_LPATTERN1_R)

    # Sketch10 → Cut-Extrude7 (cut)
    with BuildSketch(Plane.XY.offset(5.55)):
        with Locations((1.9, 1.677545183)):
            Rectangle(SKETCH10_W, SKETCH10_H)
    cut_extrude7 = extrude(amount=-CUT_EXTRUDE7_DEPTH, mode=Mode.SUBTRACT)

    # LPattern2: Cut-Extrude7 ×2
    with Locations(*[(-i * LPATTERN2_PITCH, 0, 0) for i in range(1, LPATTERN2_COUNT)]):
        add(cut_extrude7, mode=Mode.SUBTRACT)


solid = part_3.part
